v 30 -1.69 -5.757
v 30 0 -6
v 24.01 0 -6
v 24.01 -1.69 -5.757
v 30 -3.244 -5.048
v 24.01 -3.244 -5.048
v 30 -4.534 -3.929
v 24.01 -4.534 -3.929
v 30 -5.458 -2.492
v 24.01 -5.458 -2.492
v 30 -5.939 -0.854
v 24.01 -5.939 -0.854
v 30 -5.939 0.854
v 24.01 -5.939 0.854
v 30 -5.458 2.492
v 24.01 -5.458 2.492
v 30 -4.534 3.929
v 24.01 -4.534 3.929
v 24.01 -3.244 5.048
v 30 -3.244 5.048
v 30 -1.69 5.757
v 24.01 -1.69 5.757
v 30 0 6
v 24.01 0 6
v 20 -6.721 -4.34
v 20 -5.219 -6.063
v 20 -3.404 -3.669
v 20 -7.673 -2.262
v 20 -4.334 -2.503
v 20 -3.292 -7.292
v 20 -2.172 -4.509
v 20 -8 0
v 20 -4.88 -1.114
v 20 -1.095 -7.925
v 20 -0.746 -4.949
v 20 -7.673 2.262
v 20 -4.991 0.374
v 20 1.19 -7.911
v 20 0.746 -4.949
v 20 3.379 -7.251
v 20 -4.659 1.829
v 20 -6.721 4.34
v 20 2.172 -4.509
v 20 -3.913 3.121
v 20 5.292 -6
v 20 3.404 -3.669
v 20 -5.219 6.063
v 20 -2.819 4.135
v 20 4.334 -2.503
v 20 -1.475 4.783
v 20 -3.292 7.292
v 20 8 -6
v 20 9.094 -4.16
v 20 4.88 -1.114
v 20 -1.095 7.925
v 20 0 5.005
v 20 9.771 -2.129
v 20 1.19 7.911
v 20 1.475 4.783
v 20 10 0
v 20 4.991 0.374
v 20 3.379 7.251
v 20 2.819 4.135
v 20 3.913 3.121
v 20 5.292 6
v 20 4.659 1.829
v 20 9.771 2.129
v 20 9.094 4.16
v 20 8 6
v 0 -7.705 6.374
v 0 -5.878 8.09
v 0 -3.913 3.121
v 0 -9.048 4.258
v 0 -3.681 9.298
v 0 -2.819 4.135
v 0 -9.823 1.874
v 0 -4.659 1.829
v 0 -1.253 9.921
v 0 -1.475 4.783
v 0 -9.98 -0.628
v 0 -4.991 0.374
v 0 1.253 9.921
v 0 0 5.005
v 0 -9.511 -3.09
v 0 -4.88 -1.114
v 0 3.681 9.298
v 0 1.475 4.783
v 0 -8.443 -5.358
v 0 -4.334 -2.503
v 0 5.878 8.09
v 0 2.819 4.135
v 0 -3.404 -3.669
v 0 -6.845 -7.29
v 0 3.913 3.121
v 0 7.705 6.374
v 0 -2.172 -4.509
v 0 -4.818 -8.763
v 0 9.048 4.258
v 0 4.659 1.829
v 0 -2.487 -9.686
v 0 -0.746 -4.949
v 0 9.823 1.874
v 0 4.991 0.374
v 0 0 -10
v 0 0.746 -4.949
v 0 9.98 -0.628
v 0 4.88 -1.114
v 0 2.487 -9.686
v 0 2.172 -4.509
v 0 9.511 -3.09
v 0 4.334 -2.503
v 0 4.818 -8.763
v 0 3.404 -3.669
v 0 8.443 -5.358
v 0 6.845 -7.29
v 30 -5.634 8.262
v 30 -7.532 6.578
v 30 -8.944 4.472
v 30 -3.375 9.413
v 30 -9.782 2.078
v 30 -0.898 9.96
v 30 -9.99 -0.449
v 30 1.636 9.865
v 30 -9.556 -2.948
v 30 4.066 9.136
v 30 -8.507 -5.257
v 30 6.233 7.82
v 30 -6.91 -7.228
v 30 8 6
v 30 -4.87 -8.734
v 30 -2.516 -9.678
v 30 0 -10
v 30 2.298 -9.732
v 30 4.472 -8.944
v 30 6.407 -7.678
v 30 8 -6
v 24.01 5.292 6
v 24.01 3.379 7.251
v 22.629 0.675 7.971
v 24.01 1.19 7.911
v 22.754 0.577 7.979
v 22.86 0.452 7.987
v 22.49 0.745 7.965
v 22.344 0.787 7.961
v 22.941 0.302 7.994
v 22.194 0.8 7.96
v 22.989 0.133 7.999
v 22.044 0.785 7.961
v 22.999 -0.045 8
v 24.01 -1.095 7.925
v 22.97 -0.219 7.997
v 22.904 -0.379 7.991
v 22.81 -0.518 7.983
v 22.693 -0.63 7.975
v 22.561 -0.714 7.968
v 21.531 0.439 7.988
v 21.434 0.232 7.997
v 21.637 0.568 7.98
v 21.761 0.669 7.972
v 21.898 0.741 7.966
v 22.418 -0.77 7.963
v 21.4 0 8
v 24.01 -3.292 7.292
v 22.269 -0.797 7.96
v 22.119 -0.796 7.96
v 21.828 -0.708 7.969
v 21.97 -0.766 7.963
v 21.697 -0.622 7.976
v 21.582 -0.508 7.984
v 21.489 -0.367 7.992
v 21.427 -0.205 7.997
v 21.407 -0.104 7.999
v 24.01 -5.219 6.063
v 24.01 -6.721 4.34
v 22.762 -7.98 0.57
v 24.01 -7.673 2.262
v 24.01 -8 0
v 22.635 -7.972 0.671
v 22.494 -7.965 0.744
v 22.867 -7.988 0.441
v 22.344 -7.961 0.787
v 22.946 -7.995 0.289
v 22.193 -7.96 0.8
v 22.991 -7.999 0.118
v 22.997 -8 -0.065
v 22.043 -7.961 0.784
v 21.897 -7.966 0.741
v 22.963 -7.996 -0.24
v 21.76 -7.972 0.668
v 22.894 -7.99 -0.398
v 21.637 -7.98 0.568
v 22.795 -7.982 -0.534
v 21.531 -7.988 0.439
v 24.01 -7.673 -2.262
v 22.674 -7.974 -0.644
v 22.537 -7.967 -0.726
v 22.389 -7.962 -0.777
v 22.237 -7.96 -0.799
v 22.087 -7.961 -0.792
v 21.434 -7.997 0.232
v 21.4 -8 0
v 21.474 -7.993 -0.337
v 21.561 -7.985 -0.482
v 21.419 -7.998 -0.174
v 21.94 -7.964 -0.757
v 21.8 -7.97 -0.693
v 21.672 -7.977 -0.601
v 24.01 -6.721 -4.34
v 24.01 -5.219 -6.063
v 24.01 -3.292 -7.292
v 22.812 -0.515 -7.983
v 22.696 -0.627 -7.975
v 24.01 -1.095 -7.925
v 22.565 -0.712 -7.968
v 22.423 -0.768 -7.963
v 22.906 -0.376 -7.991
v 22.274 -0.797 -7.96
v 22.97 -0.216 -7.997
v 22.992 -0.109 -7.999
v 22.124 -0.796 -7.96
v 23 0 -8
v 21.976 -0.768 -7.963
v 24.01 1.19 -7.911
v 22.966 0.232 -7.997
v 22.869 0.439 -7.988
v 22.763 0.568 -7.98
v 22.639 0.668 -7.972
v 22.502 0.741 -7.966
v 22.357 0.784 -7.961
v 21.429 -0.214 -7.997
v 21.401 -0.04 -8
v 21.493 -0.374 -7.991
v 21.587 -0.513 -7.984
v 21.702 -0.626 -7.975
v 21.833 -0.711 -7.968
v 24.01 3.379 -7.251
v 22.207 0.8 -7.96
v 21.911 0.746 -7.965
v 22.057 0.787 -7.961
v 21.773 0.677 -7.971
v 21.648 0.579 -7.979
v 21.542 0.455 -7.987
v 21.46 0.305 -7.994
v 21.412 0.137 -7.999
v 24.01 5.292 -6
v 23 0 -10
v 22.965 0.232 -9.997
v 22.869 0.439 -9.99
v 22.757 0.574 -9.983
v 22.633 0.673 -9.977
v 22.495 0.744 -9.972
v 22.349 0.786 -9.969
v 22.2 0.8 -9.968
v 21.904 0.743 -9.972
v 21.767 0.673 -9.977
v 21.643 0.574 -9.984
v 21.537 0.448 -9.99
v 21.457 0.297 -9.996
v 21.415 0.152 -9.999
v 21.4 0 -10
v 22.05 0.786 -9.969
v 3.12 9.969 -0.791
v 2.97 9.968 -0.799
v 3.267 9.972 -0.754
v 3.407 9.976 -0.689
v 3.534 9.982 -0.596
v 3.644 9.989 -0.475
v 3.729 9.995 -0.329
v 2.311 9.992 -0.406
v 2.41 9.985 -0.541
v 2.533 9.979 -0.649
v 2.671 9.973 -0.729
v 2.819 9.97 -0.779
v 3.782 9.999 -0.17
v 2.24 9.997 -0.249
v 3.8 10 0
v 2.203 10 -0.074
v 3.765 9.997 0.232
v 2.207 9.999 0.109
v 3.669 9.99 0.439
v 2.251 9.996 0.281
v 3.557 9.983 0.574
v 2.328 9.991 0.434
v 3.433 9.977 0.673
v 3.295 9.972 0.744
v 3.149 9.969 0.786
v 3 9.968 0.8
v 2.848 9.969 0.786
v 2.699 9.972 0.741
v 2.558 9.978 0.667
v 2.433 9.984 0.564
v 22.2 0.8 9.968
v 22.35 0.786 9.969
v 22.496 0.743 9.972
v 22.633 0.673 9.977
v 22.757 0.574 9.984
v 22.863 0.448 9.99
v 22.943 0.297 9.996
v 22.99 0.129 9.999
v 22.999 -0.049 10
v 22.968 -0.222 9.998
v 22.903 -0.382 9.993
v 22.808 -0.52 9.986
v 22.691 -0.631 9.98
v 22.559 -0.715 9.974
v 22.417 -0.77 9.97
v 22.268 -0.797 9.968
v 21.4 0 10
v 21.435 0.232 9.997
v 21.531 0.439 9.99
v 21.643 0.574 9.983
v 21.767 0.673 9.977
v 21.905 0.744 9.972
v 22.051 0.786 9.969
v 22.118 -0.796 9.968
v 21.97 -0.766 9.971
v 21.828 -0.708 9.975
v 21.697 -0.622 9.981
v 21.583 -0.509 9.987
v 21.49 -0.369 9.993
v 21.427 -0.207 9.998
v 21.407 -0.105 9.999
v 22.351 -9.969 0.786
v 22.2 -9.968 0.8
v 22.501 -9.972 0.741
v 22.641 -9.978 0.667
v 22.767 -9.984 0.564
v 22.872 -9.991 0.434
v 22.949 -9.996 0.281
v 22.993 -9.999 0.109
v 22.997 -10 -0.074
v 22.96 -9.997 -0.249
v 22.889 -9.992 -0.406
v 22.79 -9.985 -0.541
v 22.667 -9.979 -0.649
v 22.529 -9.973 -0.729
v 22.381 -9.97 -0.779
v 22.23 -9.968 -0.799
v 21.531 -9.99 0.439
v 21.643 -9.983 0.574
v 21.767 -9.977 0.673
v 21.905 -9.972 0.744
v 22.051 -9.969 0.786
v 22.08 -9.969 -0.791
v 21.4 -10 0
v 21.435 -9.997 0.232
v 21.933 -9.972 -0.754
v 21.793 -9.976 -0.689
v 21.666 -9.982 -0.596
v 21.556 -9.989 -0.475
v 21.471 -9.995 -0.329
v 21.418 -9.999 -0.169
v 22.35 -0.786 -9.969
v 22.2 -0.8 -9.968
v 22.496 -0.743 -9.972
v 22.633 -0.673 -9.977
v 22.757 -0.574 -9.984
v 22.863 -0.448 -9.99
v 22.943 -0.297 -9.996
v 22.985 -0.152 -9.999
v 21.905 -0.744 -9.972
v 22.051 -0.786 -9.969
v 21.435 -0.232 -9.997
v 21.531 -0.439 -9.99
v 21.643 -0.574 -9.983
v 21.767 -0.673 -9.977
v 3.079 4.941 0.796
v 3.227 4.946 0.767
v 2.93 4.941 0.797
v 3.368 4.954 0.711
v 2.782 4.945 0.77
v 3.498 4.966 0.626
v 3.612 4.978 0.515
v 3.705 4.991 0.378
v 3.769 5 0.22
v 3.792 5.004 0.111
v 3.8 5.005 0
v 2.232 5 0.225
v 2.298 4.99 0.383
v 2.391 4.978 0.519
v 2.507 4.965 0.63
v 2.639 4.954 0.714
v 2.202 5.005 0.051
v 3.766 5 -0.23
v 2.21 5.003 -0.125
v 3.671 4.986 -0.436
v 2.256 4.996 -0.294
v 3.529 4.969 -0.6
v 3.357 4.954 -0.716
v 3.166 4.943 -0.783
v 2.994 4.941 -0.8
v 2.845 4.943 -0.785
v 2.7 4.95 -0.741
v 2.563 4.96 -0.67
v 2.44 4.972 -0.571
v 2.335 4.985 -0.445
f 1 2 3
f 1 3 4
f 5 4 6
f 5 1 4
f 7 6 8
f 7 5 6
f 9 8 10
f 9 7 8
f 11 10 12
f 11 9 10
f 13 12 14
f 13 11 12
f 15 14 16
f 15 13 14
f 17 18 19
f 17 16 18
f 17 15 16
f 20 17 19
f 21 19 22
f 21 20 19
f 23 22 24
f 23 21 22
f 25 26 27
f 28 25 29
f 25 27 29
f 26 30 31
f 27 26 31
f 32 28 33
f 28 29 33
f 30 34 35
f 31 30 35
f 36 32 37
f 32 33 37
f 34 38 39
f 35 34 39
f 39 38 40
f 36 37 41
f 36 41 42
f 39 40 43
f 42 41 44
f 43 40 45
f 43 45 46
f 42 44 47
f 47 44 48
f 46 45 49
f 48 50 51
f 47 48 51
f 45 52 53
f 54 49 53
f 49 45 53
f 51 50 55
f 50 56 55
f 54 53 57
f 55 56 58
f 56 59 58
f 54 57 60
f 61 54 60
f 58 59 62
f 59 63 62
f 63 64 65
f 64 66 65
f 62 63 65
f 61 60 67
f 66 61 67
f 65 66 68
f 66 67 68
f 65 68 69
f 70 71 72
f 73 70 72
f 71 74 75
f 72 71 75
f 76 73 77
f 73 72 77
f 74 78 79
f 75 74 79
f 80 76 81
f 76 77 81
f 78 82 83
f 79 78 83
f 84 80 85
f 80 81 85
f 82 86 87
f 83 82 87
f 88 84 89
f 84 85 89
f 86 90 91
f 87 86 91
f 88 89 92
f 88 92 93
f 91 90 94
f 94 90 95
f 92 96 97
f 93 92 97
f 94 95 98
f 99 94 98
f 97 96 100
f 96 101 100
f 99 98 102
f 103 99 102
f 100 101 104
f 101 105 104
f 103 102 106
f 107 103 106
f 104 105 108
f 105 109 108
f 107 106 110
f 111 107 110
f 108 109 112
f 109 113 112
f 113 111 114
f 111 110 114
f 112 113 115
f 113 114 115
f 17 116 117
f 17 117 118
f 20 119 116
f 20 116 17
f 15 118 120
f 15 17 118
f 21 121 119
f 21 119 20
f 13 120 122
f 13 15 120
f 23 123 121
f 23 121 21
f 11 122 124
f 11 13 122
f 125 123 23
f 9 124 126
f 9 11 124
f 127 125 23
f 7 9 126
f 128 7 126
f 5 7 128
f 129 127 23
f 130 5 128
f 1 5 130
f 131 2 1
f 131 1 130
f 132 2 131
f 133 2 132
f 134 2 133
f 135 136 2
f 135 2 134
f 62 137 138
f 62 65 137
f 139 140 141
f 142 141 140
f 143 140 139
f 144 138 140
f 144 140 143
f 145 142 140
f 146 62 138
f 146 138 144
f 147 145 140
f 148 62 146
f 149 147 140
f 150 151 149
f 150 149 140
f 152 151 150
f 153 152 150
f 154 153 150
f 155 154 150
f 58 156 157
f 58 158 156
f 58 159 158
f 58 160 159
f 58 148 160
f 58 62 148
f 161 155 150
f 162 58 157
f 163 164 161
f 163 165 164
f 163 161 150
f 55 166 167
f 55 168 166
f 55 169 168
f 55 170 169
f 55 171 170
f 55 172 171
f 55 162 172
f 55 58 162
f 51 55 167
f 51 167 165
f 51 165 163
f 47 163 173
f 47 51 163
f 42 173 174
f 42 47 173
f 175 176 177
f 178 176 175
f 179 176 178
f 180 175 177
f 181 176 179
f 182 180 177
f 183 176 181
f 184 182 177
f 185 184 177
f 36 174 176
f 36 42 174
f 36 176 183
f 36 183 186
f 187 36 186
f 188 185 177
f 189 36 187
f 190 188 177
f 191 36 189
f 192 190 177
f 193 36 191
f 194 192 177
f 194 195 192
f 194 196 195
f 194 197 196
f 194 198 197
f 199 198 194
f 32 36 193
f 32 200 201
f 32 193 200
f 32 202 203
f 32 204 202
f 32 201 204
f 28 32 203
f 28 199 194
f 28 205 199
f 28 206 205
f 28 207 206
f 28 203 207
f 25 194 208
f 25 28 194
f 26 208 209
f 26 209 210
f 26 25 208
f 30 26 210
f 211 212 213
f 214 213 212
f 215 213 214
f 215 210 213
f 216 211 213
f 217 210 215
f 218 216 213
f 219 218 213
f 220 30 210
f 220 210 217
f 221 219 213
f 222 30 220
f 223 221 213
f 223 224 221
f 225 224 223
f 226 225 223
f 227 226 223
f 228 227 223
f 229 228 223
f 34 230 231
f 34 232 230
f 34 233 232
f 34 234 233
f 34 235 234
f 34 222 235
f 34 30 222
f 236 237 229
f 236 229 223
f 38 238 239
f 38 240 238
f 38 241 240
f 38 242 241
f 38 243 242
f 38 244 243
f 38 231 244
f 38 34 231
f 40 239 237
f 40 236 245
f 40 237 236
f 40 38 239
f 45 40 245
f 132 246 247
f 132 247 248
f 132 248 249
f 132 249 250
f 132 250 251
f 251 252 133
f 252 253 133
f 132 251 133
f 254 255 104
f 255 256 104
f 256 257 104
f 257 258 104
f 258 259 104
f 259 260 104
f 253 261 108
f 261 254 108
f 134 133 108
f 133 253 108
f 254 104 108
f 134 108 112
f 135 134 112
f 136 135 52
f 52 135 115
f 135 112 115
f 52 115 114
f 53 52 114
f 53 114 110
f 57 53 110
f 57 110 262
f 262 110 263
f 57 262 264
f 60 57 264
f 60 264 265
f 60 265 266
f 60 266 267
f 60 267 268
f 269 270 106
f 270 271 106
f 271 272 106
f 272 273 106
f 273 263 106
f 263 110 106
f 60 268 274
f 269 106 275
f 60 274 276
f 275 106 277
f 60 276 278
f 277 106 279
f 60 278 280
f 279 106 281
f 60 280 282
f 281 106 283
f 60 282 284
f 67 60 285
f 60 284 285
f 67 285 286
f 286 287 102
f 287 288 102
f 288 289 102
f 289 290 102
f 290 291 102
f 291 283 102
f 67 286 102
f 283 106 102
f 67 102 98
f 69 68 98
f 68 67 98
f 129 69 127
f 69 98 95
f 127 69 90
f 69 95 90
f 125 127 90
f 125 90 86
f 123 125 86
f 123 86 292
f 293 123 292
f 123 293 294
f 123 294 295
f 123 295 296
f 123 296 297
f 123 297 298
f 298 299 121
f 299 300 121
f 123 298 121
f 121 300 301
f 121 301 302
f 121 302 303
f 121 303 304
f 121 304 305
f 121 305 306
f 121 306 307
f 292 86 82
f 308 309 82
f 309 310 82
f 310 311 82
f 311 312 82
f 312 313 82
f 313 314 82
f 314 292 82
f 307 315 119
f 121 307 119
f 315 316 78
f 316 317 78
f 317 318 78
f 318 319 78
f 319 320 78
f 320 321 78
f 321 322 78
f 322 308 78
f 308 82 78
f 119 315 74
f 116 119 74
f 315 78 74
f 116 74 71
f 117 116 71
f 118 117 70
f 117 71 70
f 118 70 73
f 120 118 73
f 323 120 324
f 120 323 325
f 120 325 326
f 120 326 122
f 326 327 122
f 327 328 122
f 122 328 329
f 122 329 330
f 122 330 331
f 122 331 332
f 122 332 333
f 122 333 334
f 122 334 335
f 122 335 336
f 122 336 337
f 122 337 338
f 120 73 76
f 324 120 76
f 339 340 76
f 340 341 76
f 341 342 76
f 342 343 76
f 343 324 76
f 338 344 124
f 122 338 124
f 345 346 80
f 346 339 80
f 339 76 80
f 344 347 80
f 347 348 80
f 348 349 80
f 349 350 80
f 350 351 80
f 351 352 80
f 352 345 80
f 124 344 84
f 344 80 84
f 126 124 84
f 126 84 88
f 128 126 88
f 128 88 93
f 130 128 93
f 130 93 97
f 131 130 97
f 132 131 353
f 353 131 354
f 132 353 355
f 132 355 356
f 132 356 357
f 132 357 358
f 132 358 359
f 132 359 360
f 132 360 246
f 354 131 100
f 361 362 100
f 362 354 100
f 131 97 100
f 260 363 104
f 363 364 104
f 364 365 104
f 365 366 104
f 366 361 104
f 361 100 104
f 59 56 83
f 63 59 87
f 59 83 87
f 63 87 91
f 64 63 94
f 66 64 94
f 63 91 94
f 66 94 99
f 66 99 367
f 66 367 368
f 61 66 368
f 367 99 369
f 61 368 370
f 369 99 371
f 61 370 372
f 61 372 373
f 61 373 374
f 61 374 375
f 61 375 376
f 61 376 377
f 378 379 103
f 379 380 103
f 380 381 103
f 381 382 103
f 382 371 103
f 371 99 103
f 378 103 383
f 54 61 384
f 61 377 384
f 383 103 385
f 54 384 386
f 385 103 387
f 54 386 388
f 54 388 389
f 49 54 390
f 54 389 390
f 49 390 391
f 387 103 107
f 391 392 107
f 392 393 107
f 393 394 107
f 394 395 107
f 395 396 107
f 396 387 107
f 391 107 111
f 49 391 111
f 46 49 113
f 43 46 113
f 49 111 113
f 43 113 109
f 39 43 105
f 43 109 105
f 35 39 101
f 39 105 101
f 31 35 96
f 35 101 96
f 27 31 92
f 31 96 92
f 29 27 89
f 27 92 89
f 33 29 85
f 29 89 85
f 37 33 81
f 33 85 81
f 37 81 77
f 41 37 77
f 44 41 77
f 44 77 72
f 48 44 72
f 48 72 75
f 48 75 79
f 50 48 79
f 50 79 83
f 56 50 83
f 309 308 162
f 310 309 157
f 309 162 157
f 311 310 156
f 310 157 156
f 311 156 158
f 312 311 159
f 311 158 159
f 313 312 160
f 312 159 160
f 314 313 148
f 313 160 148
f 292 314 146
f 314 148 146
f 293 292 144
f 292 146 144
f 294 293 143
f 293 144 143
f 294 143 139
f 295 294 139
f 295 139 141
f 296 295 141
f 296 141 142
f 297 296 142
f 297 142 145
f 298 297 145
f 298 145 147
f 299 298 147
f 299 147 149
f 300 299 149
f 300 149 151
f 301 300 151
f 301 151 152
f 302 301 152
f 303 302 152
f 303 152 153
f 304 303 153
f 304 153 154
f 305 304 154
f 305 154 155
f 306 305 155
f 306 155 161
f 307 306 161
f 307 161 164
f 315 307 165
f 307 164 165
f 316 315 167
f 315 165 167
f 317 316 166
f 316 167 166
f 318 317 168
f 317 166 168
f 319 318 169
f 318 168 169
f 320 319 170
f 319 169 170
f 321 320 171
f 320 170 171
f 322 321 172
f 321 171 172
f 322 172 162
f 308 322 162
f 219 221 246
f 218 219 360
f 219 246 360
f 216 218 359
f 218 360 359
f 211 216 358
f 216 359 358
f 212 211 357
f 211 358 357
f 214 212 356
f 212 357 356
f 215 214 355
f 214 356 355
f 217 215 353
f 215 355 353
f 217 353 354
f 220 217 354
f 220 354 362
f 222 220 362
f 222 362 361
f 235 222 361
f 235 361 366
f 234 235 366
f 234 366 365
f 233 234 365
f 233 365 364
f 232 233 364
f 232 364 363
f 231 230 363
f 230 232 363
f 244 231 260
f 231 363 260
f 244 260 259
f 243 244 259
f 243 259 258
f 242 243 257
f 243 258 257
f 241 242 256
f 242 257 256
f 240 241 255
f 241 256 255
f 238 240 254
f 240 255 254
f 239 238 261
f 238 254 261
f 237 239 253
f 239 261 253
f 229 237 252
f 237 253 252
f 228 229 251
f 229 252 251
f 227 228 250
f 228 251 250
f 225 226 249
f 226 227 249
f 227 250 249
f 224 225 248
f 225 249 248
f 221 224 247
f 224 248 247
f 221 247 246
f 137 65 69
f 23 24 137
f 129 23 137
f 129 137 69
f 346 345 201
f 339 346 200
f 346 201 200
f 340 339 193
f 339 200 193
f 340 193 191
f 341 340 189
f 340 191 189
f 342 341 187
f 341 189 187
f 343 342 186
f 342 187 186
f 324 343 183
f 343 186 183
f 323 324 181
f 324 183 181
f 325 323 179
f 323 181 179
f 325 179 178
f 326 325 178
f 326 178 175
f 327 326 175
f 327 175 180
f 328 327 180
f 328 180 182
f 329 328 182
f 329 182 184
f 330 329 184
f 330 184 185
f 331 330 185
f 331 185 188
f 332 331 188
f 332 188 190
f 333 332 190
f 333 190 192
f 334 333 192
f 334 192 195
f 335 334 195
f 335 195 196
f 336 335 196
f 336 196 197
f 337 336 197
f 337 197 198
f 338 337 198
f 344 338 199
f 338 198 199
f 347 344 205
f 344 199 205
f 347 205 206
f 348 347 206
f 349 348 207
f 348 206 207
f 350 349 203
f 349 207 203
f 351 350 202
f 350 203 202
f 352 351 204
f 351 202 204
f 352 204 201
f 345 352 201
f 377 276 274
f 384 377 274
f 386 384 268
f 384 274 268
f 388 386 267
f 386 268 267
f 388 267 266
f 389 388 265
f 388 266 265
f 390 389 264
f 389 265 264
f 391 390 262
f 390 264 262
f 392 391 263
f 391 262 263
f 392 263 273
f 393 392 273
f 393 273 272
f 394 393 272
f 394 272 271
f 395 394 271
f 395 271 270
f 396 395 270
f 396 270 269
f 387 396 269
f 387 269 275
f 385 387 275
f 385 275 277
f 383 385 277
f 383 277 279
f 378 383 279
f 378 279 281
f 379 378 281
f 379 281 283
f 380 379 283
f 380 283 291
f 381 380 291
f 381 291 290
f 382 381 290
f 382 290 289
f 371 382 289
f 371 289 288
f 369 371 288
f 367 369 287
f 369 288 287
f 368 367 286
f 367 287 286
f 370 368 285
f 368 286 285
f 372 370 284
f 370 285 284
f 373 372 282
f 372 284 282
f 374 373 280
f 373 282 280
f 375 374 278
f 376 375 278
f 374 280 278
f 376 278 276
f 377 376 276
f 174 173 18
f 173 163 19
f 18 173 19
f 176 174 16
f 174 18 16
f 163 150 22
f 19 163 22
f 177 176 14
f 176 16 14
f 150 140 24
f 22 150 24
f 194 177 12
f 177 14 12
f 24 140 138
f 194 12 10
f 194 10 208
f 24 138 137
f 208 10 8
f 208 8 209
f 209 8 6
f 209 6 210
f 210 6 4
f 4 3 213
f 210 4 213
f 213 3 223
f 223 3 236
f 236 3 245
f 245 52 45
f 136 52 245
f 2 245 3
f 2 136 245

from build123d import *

# Parameters (mm, degrees)
SKETCH1_R                  = 10
BOSS_EXTRUDE1_DEPTH        = 30
SKETCH2_R                  = 5.005
CUT_EXTRUDE1_DEPTH         = 20
CUT_EXTRUDE2_DEPTH         = 10
SKETCH4_R                  = 8
CUT_EXTRUDE3_DEPTH         = 4.01
M2X0_4_TAPPED_HOLE1_REACH  = 39.417
M2X0_4_TAPPED_HOLE1_BORE_R = 0.8
M2X0_4_TAPPED_HOLE2_D      = 1.6
M2X0_4_TAPPED_HOLE3_D      = 1.6
M2X0_4_TAPPED_HOLE4_REACH  = 39.417
M2X0_4_TAPPED_HOLE4_BORE_R = 0.8


with BuildPart() as part:
    # Sketch1 → Boss-Extrude1 (new body)
    with BuildSketch(Plane(origin=(0, 0, 0), x_dir=(0, 0, -1), z_dir=(1, 0, 0))):
        Circle(SKETCH1_R)
    extrude(amount=BOSS_EXTRUDE1_DEPTH)

    # Sketch2 → Cut-Extrude1 (cut)
    with BuildSketch(Plane.ZY):
        Circle(SKETCH2_R)
    extrude(amount=-CUT_EXTRUDE1_DEPTH, mode=Mode.SUBTRACT)

    # Sketch3 → Cut-Extrude2 (cut)
    with BuildSketch(Plane(origin=(30, 0, 0), x_dir=(0, 0, -1), z_dir=(1, 0, 0))):
        with BuildLine():
            Line((-6, 0), (-6, 8))
            ThreePointArc((-6, 8), (0, 10), (6, 8))
            Line((6, 8), (6, 0))
            ThreePointArc((6, 0), (0, -6), (-6, 0))
        make_face()
    extrude(amount=-CUT_EXTRUDE2_DEPTH, mode=Mode.SUBTRACT)

    # Sketch4 → Cut-Extrude3 (cut)
    with BuildSketch(Plane(origin=(20, 0, 0), x_dir=(0, 0, -1), z_dir=(1, 0, 0))):
        Circle(SKETCH4_R)
    extrude(amount=CUT_EXTRUDE3_DEPTH, mode=Mode.SUBTRACT)

    # M2x0.4 Tapped Hole1 bore → M2x0.4 Tapped Hole1 (cut, up to next)
    with BuildSketch(Plane(origin=(0, 0, -10), x_dir=(1, 0, 0), z_dir=(0, 0, -1)), mode=Mode.PRIVATE) as m2x0_4_tapped_hole1_sk1:
        with Locations((22.2, 0)):
            Circle(M2X0_4_TAPPED_HOLE1_BORE_R)
    m2x0_4_tapped_hole1_tool1 = extrude(m2x0_4_tapped_hole1_sk1.sketch, amount=-M2X0_4_TAPPED_HOLE1_REACH, mode=Mode.PRIVATE) & part.part
    add(m2x0_4_tapped_hole1_tool1.solids().sort_by_distance((22.2, 0, -10))[0], mode=Mode.SUBTRACT)

    # M2x0.4 Tapped Hole2 (through all)
    with Locations(Plane.XY.offset(10)):
        with Locations((22.2, 0)):
            Hole(M2X0_4_TAPPED_HOLE2_D / 2)

    # M2x0.4 Tapped Hole3 (through all)
    with Locations(Plane.XZ.offset(10)):
        with Locations((22.2, 0)):
            Hole(M2X0_4_TAPPED_HOLE3_D / 2)

    # M2x0.4 Tapped Hole4 bore → M2x0.4 Tapped Hole4 (cut, up to next)
    with BuildSketch(Plane(origin=(0, 10, 0), x_dir=(1, 0, 0), z_dir=(0, 1, 0)), mode=Mode.PRIVATE) as m2x0_4_tapped_hole4_sk1:
        with Locations((3, 0)):
            Circle(M2X0_4_TAPPED_HOLE4_BORE_R)
    m2x0_4_tapped_hole4_tool1 = extrude(m2x0_4_tapped_hole4_sk1.sketch, amount=-M2X0_4_TAPPED_HOLE4_REACH, mode=Mode.PRIVATE) & part.part
    add(m2x0_4_tapped_hole4_tool1.solids().sort_by_distance((3, 10, 0))[0], mode=Mode.SUBTRACT)


solid = part.part
